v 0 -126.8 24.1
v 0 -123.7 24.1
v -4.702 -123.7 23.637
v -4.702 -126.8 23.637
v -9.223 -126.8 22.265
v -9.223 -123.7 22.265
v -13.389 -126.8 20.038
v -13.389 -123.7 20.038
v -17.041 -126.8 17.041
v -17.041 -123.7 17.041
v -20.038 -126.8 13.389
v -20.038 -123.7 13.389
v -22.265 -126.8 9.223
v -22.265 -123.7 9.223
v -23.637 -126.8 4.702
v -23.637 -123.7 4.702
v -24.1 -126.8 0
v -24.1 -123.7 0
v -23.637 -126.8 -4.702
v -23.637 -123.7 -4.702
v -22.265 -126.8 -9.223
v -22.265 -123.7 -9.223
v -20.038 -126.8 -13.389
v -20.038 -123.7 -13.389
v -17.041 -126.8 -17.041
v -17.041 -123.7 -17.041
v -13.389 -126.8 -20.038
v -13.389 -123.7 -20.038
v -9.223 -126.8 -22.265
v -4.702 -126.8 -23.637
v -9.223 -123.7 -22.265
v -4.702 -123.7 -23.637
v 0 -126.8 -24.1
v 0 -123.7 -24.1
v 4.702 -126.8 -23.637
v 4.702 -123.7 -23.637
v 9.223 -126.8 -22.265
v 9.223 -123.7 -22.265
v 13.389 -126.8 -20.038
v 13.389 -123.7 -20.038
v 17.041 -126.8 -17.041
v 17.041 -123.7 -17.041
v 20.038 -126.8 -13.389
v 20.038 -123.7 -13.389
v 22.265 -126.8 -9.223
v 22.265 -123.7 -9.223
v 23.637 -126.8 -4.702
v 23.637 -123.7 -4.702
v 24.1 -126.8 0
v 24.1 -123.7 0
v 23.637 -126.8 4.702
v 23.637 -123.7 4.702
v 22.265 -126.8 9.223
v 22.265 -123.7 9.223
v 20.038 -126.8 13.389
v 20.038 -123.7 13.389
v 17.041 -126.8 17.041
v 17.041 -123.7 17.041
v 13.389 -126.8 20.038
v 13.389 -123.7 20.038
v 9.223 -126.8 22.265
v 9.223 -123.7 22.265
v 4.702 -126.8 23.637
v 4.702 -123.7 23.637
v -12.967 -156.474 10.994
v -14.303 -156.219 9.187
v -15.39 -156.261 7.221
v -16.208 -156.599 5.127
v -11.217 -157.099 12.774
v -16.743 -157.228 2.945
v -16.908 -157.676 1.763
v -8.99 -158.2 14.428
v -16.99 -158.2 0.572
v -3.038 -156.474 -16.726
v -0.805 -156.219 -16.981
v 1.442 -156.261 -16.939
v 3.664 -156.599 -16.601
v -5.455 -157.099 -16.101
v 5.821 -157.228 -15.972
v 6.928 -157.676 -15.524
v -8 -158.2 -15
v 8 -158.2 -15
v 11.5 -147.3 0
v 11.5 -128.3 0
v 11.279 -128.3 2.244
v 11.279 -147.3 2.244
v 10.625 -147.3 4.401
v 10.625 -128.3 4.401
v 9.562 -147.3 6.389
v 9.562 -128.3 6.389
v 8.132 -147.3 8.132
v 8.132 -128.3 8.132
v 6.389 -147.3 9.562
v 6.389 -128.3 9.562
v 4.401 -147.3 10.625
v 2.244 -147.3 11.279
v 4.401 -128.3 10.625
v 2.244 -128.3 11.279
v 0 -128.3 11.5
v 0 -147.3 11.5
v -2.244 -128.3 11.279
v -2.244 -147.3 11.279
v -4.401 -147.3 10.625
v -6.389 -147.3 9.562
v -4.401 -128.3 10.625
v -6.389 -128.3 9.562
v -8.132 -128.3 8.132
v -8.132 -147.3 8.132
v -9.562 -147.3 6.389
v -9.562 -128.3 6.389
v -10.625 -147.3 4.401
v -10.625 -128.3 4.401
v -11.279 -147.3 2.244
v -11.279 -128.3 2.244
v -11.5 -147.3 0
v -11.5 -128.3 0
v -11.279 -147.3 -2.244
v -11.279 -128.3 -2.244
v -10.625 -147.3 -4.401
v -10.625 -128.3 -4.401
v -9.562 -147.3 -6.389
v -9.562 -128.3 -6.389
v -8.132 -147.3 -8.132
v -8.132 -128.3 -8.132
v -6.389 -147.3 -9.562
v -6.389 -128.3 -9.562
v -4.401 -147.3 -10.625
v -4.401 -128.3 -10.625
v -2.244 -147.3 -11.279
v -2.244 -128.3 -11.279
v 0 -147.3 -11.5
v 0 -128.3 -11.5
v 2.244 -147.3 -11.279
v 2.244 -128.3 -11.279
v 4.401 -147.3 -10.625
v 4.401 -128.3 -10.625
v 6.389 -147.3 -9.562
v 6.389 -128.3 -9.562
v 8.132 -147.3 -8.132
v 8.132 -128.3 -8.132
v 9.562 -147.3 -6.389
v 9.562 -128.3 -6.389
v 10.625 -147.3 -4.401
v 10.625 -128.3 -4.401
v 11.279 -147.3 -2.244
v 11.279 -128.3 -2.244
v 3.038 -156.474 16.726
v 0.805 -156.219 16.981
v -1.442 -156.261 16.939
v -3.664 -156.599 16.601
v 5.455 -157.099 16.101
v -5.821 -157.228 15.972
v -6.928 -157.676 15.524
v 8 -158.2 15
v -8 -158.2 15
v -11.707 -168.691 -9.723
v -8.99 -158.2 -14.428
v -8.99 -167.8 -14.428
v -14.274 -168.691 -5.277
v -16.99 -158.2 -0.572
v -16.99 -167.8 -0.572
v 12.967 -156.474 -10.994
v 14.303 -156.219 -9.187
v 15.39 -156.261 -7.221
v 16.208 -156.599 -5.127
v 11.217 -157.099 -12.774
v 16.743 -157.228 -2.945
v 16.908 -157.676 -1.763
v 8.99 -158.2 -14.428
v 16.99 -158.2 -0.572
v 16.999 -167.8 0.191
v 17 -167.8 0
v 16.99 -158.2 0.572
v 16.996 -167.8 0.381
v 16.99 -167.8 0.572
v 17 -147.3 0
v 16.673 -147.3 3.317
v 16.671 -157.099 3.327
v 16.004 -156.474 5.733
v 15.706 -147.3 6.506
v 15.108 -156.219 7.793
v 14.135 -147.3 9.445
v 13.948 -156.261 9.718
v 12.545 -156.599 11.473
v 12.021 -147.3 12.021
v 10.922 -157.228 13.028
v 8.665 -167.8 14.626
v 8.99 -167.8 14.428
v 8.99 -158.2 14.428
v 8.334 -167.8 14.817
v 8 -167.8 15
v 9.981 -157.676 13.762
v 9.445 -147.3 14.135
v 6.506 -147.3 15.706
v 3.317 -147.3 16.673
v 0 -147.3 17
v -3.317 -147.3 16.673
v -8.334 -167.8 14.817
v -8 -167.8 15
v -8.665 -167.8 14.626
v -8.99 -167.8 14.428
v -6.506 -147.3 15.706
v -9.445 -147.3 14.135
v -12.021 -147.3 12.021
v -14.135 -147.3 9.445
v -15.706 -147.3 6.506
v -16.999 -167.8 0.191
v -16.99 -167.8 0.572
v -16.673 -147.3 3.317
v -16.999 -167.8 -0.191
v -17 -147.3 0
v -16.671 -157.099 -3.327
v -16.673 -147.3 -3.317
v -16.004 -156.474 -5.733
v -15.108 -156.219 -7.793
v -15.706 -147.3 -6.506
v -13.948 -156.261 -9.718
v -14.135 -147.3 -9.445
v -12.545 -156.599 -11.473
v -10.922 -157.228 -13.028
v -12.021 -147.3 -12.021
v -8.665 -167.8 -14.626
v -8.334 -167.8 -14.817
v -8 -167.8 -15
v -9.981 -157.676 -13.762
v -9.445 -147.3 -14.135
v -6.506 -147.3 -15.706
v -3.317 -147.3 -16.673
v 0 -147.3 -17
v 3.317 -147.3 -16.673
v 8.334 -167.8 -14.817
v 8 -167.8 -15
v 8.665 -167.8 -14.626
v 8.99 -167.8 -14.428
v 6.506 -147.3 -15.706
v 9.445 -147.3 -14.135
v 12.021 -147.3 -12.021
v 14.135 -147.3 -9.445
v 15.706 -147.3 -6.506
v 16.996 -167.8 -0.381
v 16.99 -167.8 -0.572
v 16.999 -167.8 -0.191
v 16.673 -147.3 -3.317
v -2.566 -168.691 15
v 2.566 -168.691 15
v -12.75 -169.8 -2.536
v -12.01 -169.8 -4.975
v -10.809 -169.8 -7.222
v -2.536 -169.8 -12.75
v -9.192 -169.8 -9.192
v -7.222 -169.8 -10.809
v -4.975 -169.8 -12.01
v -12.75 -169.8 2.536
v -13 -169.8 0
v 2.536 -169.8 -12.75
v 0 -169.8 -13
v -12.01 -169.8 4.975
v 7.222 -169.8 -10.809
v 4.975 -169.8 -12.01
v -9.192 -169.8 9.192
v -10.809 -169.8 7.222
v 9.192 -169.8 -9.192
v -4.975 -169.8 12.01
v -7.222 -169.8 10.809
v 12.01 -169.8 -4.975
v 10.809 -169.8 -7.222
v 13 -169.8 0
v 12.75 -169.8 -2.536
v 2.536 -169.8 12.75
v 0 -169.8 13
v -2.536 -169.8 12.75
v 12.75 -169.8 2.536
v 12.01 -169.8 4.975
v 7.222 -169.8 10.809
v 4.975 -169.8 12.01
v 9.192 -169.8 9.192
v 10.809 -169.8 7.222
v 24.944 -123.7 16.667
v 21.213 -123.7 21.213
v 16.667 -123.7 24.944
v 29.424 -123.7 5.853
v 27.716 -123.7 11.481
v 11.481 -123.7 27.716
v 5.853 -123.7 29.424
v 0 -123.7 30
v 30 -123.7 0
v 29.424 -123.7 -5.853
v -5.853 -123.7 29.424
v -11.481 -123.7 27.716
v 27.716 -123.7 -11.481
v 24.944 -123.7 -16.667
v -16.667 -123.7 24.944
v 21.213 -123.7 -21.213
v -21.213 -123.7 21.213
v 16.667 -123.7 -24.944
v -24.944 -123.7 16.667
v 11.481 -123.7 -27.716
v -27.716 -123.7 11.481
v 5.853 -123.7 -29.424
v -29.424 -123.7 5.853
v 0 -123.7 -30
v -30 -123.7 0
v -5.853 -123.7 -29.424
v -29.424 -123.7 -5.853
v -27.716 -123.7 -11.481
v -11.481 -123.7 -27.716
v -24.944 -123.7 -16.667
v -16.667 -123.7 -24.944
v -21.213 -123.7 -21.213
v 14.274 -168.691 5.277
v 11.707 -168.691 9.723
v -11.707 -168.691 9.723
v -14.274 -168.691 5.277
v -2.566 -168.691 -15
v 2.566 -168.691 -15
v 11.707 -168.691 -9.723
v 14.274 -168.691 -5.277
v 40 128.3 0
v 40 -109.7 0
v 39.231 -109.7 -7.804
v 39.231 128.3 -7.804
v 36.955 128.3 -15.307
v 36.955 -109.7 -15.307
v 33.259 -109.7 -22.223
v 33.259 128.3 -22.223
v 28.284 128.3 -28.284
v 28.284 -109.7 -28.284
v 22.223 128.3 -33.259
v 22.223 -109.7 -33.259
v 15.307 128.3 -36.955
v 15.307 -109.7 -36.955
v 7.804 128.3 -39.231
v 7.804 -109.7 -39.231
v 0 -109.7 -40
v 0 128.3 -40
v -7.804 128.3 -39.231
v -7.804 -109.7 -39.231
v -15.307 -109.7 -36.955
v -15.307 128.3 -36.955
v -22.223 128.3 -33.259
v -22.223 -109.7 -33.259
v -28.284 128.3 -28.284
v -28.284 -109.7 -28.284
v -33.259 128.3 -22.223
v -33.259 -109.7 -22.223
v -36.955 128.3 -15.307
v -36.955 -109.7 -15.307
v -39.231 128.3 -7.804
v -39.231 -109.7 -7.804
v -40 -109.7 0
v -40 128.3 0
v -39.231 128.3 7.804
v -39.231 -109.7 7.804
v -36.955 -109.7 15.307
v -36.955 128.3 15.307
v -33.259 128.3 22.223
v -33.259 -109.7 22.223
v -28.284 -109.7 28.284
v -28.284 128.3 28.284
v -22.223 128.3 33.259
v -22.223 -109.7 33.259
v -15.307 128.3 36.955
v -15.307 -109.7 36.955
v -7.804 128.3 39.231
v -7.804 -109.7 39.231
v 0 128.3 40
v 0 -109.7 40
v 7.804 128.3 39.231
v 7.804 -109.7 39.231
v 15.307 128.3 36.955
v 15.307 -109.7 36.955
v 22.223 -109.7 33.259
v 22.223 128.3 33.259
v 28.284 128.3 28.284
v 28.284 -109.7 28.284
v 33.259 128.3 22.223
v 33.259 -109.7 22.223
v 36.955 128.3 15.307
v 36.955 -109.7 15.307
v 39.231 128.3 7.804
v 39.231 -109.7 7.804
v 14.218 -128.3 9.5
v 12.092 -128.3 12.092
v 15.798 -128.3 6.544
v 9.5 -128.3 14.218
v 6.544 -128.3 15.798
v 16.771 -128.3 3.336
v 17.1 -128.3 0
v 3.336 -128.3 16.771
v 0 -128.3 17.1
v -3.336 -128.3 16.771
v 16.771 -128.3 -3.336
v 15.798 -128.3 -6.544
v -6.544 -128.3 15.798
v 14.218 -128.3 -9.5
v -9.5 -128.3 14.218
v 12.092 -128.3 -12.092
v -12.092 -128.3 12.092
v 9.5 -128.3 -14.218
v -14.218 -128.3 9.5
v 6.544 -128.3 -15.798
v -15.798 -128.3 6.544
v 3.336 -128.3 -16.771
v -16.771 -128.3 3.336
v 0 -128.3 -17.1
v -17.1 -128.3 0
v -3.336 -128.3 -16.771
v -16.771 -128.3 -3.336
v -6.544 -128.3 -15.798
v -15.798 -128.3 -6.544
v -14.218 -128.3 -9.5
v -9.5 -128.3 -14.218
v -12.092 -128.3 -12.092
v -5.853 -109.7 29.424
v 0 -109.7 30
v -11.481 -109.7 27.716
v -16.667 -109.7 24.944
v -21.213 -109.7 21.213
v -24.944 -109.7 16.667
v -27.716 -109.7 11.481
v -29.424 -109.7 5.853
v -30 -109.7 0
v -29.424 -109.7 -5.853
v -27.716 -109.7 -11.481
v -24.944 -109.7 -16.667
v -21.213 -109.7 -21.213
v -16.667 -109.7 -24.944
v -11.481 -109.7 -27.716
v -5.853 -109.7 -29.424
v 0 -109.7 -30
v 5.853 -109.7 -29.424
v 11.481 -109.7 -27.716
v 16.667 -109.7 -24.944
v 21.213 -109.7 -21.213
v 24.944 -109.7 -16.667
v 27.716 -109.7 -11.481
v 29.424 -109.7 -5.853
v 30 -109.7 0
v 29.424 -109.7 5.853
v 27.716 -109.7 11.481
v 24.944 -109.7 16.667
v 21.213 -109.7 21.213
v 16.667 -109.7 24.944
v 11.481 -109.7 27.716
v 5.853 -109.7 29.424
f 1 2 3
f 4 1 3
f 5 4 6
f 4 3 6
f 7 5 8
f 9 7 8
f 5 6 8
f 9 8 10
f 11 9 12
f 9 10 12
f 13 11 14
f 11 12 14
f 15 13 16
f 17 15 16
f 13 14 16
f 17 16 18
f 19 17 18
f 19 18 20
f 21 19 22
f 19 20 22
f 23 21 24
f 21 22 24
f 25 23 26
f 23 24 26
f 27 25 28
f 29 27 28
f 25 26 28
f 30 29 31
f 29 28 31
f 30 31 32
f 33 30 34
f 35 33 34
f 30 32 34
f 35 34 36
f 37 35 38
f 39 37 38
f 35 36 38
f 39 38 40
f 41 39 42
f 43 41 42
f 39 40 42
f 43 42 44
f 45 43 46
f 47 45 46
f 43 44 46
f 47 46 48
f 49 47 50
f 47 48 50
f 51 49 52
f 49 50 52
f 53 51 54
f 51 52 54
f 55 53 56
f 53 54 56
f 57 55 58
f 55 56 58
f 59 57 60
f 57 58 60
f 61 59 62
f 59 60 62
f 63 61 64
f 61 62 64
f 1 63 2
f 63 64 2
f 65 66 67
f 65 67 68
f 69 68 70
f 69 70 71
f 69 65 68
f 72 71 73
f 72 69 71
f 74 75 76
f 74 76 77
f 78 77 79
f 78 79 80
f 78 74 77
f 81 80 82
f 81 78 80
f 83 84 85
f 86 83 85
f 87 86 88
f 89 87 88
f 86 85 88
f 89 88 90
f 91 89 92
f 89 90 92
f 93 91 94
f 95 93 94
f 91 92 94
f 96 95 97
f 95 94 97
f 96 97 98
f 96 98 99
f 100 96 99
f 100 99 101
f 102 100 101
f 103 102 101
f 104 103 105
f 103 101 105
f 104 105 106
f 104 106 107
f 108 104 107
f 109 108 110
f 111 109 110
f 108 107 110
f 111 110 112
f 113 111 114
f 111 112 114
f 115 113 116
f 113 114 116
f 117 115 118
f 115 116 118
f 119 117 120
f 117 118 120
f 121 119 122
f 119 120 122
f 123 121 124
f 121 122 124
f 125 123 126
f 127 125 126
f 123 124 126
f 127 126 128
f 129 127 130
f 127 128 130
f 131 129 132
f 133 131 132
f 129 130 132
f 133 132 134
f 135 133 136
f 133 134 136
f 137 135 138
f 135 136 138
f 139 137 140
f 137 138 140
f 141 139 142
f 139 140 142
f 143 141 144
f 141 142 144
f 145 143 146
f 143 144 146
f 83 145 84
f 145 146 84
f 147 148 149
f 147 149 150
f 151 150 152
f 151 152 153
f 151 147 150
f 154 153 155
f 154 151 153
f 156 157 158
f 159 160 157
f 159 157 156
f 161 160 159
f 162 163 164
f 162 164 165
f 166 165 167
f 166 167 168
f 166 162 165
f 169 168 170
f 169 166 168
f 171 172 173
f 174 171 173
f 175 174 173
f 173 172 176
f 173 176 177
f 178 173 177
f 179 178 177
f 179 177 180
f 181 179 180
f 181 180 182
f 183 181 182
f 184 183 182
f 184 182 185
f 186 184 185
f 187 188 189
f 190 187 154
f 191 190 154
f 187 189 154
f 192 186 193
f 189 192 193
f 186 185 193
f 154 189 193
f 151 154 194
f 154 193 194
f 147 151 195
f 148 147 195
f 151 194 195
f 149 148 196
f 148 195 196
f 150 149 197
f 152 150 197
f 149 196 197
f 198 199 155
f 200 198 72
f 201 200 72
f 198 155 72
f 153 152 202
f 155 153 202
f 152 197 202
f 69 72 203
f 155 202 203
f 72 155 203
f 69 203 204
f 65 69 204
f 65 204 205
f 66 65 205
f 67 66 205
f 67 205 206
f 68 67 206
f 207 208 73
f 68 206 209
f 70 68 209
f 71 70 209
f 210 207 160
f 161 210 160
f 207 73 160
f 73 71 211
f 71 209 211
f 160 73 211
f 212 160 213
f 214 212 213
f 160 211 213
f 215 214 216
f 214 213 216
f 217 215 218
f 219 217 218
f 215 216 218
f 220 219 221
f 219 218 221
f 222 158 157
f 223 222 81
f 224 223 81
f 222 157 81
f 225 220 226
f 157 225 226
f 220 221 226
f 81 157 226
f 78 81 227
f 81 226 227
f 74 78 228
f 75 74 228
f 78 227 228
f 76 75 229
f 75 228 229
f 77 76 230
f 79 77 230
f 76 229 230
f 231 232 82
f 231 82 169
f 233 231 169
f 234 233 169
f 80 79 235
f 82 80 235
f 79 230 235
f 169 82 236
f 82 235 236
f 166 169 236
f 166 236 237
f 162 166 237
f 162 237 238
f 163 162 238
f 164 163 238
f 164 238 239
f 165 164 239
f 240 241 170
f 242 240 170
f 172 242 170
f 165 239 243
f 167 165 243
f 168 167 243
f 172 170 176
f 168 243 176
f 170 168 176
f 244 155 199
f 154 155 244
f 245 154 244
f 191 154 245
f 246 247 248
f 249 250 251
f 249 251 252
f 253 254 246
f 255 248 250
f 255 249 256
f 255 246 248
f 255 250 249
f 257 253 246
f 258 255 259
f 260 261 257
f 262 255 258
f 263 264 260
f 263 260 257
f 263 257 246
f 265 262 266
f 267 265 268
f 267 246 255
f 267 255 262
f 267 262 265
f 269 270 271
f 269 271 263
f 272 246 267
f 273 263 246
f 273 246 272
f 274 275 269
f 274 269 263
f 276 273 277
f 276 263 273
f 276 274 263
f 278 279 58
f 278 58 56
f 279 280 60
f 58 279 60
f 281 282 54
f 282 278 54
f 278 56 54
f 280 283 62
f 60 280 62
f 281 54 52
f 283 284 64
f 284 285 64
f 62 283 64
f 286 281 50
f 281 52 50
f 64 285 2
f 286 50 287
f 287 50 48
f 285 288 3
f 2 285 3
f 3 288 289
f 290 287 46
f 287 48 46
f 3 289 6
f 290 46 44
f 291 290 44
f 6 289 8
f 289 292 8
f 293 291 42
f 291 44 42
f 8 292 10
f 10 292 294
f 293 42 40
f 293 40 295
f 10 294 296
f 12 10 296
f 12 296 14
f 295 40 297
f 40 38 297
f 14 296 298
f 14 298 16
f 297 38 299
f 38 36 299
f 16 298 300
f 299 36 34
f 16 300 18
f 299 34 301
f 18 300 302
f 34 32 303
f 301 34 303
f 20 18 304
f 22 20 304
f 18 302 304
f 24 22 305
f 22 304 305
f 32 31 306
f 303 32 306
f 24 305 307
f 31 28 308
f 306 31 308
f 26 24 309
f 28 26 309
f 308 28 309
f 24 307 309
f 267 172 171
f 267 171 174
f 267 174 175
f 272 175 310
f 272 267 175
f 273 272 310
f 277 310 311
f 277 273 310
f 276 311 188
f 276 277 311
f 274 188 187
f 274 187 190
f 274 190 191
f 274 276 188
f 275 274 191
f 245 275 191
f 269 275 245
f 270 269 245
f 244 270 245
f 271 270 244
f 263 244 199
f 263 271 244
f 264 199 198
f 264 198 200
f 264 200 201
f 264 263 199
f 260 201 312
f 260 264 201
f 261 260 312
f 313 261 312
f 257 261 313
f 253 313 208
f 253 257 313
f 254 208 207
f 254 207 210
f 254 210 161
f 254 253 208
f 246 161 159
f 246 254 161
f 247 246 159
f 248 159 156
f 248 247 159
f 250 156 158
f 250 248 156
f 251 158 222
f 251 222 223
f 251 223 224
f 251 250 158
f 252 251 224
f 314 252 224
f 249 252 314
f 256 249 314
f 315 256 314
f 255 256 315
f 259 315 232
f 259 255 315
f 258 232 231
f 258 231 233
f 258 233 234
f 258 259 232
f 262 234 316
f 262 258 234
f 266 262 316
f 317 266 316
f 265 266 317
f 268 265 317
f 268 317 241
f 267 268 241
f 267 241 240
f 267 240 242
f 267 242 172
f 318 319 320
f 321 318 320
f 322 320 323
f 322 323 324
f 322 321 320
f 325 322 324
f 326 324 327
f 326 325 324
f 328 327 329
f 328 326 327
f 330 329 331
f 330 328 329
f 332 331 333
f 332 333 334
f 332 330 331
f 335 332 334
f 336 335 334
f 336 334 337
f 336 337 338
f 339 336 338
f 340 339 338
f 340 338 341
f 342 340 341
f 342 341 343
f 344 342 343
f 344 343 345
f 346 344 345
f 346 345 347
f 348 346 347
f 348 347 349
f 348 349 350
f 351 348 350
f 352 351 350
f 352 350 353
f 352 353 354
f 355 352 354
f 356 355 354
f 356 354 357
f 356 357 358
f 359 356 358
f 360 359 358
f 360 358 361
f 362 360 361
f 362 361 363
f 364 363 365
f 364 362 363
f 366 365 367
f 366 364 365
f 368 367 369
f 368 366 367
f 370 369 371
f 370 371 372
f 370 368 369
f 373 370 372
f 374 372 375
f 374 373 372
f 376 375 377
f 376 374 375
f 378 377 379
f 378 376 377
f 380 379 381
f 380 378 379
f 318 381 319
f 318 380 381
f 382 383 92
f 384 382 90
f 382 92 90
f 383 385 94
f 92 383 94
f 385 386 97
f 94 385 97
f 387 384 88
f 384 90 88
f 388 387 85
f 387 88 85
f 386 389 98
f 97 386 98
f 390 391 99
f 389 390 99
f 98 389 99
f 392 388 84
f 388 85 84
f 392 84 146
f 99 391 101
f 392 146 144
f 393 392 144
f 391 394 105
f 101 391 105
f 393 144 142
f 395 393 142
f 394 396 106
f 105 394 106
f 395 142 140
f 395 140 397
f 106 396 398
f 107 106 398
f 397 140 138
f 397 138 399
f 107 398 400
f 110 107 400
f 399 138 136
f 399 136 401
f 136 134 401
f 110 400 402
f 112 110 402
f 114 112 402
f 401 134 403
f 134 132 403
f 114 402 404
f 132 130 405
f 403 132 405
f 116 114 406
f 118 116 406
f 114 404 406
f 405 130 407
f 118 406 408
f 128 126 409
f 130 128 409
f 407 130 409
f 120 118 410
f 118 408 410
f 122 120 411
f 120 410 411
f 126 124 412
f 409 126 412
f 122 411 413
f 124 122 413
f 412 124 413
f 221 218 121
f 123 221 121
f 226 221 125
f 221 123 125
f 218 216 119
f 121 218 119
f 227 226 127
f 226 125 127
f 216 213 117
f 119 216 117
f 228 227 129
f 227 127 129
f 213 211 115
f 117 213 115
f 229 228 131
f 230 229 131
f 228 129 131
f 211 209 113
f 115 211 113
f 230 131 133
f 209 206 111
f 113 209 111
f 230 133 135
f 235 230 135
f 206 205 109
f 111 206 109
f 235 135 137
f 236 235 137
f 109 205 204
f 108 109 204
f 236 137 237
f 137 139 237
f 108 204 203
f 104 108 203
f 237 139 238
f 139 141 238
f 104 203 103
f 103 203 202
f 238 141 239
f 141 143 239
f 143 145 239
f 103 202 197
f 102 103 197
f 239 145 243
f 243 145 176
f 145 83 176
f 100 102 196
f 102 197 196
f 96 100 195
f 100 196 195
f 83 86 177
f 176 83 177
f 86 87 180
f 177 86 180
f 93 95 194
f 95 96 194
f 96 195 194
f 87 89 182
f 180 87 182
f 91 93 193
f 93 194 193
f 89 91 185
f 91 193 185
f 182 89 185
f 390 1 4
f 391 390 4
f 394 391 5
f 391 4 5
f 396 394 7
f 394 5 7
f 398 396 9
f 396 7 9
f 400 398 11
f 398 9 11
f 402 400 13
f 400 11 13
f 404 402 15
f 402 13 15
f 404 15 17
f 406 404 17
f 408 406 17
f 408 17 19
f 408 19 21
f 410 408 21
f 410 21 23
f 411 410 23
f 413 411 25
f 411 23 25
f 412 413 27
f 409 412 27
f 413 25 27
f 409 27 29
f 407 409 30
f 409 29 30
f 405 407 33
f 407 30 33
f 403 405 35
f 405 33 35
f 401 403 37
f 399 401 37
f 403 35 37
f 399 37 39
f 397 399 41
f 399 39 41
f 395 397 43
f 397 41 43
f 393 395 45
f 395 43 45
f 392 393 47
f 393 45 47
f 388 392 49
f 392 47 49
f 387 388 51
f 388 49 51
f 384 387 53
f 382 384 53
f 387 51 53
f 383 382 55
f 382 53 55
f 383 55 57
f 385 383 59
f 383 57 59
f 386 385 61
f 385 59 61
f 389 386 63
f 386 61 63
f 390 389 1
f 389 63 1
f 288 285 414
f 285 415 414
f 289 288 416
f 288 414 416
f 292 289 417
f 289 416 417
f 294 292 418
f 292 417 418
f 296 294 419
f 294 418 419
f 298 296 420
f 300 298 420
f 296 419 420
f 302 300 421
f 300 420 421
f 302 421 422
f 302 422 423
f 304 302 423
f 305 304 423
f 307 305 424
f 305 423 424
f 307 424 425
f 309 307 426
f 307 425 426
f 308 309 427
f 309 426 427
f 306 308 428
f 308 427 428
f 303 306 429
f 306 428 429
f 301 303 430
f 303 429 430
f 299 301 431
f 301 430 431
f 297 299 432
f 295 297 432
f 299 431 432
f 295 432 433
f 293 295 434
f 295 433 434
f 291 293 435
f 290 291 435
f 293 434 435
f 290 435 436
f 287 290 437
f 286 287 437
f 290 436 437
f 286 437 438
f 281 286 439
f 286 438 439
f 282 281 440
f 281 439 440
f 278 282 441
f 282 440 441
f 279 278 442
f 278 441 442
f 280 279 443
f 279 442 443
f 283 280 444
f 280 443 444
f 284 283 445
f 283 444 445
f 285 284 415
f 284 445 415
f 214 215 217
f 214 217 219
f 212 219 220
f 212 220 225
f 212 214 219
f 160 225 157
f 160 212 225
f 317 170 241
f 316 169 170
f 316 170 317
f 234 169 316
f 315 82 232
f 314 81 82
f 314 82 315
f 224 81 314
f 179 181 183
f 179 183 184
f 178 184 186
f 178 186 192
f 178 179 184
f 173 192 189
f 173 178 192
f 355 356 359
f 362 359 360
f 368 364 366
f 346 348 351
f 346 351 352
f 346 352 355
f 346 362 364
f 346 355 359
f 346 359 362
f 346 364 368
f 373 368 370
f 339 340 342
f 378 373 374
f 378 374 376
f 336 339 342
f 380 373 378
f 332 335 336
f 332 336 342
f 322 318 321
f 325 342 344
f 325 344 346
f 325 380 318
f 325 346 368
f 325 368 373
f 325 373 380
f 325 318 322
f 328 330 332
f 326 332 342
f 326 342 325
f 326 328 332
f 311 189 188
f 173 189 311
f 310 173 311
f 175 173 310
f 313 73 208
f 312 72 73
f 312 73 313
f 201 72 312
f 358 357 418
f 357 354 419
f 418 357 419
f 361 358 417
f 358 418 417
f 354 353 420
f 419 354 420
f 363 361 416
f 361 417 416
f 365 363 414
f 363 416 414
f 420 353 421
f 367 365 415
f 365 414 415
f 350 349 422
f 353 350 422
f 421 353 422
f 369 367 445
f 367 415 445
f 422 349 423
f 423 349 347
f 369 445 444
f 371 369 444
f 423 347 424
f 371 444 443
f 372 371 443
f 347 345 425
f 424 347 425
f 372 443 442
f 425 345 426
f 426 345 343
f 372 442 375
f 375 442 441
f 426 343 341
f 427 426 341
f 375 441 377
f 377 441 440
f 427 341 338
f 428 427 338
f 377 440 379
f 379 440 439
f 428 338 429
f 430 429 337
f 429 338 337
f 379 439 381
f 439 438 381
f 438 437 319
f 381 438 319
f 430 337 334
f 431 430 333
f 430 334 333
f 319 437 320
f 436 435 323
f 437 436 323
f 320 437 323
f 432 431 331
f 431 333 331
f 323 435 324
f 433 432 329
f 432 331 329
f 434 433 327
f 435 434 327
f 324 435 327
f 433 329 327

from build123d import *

# Parameters (mm, degrees)
CHAMFER2_SIZE       = 7
CHAMFER2_SIZE2      = 1.5
SKETCH2_R           = 11.5
BOSS_EXTRUDE1_DEPTH = 19
SKETCH3_R           = 17
BOSS_EXTRUDE2_DEPTH = 22.5
CHAMFER3_SIZE       = 2
CHAMFER3_SIZE2      = 4
CUT_EXTRUDE1_DEPTH  = 41
CIRPATTERN1_COUNT   = 6
SKETCH21_R          = 40
BOSS_EXTRUDE9_DEPTH = 238


with BuildPart() as part:
    # Sketch1 → Revolve1 (revolve)
    with BuildSketch(Plane(origin=(0, 0, 0), x_dir=(0, 0, -1), z_dir=(1, 0, 0))):
        Polygon((0, 128.3), (0, -128.3), (-24.1, -128.3), (-24.1, -123.7), (-30, -123.7), (-30, -109.7), (-39.9, -109.7), (-39.9, -99.7), (-40, -99.7), (-40, 100.3), (-39.9, 100.3), (-39.9, 128.3), align=None)
    revolve(axis=Axis((0, 128.3, 0), (0, -1, 0)))

    # Chamfer2
    chamfer2_edges = [part.edges().sort_by_distance(p)[0] for p in [
        (0, -128.3, -24.1),
    ]]
    chamfer2_side = [part.faces().sort_by_distance(p)[0] for p in [
        (0, -128.3, 0),
    ]]
    chamfer(chamfer2_edges, length=CHAMFER2_SIZE, length2=CHAMFER2_SIZE2, reference=chamfer2_side[0])

    # Sketch2 → Boss-Extrude1 (add)
    with BuildSketch(Plane.XZ.offset(128.3)):
        Circle(SKETCH2_R)
    extrude(amount=BOSS_EXTRUDE1_DEPTH)

    # Sketch3 → Boss-Extrude2 (add)
    with BuildSketch(Plane.XZ.offset(147.3)):
        Circle(SKETCH3_R)
    extrude(amount=BOSS_EXTRUDE2_DEPTH)

    # Chamfer3
    chamfer3_edges = [part.edges().sort_by_distance(p)[0] for p in [
        (-17, -169.8, 0),
    ]]
    chamfer3_side = [part.faces().sort_by_distance(p)[0] for p in [
        (-17, -158.55, 0),
    ]]
    chamfer(chamfer3_edges, length=CHAMFER3_SIZE, length2=CHAMFER3_SIZE2, reference=chamfer3_side[0])

    # Sketch7 → Cut-Extrude1 (cut, symmetric)
    with BuildSketch(Plane(origin=(0, 0, 0), x_dir=(0, 0, -1), z_dir=(1, 0, 0))):
        Polygon((-29.89327327, -143.30672673), (-15, -158.2), (-15, -177.081282463), (-29.89327327, -177.081282463), align=None)
    cut_extrude1 = extrude(amount=CUT_EXTRUDE1_DEPTH, both=True, mode=Mode.SUBTRACT)

    # CirPattern1: Cut-Extrude1 ×6 about axis
    cirpattern1_axis = Axis((0, 0, 0), (0, 1, 0))
    for i in range(1, CIRPATTERN1_COUNT):
        add(cut_extrude1.rotate(cirpattern1_axis, i * 360 / CIRPATTERN1_COUNT), mode=Mode.SUBTRACT)

    # Sketch21 → Boss-Extrude9 (add)
    with BuildSketch(Plane(origin=(0, 128.3, 0), x_dir=(1, 0, 0), z_dir=(0, 1, 0))):
        Circle(SKETCH21_R)
    extrude(amount=-BOSS_EXTRUDE9_DEPTH)


solid = part.part
